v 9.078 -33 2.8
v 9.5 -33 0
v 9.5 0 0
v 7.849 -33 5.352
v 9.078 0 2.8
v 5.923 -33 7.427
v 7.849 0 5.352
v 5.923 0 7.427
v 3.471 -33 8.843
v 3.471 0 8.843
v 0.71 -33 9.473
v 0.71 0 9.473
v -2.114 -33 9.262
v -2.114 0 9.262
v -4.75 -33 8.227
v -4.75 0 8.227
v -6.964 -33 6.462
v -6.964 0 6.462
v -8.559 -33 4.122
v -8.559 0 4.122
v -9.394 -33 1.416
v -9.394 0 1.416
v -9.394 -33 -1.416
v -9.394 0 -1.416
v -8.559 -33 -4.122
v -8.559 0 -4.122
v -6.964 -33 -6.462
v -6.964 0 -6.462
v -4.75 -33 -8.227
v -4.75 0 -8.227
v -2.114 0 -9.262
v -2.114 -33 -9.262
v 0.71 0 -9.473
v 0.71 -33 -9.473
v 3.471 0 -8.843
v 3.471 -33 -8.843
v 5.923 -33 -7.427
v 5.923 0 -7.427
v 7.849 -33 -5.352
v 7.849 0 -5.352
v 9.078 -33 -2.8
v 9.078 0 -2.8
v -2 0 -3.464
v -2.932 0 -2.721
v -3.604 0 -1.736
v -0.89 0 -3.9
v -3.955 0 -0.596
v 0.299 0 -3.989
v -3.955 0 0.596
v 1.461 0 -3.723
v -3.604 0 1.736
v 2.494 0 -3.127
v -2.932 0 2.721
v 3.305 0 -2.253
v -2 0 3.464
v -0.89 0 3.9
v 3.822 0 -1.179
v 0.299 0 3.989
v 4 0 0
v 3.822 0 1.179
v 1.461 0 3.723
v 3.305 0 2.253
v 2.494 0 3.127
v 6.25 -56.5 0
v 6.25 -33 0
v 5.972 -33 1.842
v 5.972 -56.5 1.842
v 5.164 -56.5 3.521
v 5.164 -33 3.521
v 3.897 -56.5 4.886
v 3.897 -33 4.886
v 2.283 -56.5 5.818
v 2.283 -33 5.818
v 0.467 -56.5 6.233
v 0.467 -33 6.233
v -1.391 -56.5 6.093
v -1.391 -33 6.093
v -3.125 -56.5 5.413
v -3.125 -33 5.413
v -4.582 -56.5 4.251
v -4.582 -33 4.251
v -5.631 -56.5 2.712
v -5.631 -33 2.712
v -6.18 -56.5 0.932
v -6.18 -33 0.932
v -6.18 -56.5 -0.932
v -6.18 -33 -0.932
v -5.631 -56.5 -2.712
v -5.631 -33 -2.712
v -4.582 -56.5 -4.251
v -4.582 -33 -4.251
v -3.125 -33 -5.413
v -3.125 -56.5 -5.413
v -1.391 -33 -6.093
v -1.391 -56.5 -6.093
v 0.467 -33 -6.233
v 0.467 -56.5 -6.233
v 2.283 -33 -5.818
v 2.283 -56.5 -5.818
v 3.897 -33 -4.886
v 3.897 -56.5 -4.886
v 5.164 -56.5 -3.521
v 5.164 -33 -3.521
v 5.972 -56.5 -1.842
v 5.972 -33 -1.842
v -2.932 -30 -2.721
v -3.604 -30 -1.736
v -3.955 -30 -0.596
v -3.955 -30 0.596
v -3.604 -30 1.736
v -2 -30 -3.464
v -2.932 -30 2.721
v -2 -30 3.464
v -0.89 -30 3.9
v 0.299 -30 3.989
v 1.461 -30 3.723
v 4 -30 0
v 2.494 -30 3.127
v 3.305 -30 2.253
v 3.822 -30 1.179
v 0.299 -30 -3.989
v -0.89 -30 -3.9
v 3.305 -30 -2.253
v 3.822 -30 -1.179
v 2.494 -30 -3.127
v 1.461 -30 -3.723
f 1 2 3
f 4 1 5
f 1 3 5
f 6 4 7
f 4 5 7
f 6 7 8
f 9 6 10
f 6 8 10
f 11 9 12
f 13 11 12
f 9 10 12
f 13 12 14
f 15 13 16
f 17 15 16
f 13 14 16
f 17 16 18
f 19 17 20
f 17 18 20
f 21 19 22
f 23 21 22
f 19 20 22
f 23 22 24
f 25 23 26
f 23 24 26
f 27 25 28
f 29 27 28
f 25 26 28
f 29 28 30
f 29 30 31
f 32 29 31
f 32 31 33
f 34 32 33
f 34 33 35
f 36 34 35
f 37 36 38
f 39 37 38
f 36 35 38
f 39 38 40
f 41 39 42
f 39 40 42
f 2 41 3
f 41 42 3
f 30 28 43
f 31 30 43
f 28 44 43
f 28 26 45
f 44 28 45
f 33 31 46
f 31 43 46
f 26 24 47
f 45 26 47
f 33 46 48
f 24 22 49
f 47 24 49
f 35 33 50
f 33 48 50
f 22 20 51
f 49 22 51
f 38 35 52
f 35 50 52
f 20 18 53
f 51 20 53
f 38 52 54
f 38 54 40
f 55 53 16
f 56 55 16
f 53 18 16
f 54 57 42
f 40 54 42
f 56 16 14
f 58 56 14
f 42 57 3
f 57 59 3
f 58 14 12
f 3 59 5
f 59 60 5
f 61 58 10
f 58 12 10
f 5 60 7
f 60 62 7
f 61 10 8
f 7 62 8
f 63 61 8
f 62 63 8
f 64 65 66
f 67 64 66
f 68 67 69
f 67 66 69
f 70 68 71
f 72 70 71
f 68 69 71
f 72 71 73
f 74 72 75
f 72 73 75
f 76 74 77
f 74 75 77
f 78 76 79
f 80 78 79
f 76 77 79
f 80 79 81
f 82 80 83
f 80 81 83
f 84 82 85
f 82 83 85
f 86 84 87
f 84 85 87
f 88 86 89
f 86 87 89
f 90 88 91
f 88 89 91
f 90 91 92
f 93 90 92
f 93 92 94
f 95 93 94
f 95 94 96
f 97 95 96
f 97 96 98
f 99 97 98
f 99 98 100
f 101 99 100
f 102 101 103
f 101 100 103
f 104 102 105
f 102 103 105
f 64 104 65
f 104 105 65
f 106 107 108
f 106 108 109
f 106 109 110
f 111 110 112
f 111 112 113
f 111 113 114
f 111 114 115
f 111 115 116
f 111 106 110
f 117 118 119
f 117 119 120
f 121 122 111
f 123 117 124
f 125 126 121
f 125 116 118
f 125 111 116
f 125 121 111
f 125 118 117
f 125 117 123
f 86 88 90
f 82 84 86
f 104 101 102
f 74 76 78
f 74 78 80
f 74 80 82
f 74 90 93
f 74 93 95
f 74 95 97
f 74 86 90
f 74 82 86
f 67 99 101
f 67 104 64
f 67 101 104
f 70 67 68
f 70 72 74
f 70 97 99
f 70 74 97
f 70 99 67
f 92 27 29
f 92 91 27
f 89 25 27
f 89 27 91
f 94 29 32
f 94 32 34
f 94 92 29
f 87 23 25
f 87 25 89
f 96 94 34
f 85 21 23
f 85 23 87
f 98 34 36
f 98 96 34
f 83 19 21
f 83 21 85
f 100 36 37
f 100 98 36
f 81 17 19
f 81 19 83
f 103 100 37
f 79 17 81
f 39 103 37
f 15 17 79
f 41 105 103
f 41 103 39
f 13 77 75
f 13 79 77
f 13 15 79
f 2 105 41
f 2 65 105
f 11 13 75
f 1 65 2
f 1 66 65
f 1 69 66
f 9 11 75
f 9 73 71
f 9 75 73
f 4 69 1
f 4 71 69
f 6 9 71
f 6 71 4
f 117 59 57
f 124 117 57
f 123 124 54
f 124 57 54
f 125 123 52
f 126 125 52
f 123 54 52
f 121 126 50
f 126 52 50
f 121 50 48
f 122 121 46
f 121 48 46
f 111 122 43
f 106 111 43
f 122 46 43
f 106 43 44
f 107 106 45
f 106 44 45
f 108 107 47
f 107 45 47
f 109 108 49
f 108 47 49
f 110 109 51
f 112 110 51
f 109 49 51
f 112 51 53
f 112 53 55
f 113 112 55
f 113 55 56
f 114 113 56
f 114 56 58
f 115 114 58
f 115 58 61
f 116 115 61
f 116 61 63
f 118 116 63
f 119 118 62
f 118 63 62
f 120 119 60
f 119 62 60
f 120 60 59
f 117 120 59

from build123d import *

# Parameters (mm, degrees)
SKETCH_R     = 9.5
PAD_DEPTH    = 33
SKETCH001_R  = 4
POCKET_DEPTH = 30
SKETCH002_R  = 6.25
PAD001_DEPTH = 23.5


with BuildPart() as part:
    # Sketch → Pad (new body)
    with BuildSketch(Plane.XZ):
        Circle(SKETCH_R)
    extrude(amount=PAD_DEPTH)

    # Sketch001 (on Face2 of Pad) → Pocket (cut)
    with BuildSketch(Plane(origin=(0, 0, 0), x_dir=(1, 0, 0), z_dir=(0, 1, 0))):
        Circle(SKETCH001_R)
    extrude(amount=-POCKET_DEPTH, mode=Mode.SUBTRACT)

    # Sketch002 (on Face3 of Pocket) → Pad001 (join)
    with BuildSketch(Plane.XZ.offset(33)):
        Circle(SKETCH002_R)
    extrude(amount=PAD001_DEPTH)


solid = part.part
